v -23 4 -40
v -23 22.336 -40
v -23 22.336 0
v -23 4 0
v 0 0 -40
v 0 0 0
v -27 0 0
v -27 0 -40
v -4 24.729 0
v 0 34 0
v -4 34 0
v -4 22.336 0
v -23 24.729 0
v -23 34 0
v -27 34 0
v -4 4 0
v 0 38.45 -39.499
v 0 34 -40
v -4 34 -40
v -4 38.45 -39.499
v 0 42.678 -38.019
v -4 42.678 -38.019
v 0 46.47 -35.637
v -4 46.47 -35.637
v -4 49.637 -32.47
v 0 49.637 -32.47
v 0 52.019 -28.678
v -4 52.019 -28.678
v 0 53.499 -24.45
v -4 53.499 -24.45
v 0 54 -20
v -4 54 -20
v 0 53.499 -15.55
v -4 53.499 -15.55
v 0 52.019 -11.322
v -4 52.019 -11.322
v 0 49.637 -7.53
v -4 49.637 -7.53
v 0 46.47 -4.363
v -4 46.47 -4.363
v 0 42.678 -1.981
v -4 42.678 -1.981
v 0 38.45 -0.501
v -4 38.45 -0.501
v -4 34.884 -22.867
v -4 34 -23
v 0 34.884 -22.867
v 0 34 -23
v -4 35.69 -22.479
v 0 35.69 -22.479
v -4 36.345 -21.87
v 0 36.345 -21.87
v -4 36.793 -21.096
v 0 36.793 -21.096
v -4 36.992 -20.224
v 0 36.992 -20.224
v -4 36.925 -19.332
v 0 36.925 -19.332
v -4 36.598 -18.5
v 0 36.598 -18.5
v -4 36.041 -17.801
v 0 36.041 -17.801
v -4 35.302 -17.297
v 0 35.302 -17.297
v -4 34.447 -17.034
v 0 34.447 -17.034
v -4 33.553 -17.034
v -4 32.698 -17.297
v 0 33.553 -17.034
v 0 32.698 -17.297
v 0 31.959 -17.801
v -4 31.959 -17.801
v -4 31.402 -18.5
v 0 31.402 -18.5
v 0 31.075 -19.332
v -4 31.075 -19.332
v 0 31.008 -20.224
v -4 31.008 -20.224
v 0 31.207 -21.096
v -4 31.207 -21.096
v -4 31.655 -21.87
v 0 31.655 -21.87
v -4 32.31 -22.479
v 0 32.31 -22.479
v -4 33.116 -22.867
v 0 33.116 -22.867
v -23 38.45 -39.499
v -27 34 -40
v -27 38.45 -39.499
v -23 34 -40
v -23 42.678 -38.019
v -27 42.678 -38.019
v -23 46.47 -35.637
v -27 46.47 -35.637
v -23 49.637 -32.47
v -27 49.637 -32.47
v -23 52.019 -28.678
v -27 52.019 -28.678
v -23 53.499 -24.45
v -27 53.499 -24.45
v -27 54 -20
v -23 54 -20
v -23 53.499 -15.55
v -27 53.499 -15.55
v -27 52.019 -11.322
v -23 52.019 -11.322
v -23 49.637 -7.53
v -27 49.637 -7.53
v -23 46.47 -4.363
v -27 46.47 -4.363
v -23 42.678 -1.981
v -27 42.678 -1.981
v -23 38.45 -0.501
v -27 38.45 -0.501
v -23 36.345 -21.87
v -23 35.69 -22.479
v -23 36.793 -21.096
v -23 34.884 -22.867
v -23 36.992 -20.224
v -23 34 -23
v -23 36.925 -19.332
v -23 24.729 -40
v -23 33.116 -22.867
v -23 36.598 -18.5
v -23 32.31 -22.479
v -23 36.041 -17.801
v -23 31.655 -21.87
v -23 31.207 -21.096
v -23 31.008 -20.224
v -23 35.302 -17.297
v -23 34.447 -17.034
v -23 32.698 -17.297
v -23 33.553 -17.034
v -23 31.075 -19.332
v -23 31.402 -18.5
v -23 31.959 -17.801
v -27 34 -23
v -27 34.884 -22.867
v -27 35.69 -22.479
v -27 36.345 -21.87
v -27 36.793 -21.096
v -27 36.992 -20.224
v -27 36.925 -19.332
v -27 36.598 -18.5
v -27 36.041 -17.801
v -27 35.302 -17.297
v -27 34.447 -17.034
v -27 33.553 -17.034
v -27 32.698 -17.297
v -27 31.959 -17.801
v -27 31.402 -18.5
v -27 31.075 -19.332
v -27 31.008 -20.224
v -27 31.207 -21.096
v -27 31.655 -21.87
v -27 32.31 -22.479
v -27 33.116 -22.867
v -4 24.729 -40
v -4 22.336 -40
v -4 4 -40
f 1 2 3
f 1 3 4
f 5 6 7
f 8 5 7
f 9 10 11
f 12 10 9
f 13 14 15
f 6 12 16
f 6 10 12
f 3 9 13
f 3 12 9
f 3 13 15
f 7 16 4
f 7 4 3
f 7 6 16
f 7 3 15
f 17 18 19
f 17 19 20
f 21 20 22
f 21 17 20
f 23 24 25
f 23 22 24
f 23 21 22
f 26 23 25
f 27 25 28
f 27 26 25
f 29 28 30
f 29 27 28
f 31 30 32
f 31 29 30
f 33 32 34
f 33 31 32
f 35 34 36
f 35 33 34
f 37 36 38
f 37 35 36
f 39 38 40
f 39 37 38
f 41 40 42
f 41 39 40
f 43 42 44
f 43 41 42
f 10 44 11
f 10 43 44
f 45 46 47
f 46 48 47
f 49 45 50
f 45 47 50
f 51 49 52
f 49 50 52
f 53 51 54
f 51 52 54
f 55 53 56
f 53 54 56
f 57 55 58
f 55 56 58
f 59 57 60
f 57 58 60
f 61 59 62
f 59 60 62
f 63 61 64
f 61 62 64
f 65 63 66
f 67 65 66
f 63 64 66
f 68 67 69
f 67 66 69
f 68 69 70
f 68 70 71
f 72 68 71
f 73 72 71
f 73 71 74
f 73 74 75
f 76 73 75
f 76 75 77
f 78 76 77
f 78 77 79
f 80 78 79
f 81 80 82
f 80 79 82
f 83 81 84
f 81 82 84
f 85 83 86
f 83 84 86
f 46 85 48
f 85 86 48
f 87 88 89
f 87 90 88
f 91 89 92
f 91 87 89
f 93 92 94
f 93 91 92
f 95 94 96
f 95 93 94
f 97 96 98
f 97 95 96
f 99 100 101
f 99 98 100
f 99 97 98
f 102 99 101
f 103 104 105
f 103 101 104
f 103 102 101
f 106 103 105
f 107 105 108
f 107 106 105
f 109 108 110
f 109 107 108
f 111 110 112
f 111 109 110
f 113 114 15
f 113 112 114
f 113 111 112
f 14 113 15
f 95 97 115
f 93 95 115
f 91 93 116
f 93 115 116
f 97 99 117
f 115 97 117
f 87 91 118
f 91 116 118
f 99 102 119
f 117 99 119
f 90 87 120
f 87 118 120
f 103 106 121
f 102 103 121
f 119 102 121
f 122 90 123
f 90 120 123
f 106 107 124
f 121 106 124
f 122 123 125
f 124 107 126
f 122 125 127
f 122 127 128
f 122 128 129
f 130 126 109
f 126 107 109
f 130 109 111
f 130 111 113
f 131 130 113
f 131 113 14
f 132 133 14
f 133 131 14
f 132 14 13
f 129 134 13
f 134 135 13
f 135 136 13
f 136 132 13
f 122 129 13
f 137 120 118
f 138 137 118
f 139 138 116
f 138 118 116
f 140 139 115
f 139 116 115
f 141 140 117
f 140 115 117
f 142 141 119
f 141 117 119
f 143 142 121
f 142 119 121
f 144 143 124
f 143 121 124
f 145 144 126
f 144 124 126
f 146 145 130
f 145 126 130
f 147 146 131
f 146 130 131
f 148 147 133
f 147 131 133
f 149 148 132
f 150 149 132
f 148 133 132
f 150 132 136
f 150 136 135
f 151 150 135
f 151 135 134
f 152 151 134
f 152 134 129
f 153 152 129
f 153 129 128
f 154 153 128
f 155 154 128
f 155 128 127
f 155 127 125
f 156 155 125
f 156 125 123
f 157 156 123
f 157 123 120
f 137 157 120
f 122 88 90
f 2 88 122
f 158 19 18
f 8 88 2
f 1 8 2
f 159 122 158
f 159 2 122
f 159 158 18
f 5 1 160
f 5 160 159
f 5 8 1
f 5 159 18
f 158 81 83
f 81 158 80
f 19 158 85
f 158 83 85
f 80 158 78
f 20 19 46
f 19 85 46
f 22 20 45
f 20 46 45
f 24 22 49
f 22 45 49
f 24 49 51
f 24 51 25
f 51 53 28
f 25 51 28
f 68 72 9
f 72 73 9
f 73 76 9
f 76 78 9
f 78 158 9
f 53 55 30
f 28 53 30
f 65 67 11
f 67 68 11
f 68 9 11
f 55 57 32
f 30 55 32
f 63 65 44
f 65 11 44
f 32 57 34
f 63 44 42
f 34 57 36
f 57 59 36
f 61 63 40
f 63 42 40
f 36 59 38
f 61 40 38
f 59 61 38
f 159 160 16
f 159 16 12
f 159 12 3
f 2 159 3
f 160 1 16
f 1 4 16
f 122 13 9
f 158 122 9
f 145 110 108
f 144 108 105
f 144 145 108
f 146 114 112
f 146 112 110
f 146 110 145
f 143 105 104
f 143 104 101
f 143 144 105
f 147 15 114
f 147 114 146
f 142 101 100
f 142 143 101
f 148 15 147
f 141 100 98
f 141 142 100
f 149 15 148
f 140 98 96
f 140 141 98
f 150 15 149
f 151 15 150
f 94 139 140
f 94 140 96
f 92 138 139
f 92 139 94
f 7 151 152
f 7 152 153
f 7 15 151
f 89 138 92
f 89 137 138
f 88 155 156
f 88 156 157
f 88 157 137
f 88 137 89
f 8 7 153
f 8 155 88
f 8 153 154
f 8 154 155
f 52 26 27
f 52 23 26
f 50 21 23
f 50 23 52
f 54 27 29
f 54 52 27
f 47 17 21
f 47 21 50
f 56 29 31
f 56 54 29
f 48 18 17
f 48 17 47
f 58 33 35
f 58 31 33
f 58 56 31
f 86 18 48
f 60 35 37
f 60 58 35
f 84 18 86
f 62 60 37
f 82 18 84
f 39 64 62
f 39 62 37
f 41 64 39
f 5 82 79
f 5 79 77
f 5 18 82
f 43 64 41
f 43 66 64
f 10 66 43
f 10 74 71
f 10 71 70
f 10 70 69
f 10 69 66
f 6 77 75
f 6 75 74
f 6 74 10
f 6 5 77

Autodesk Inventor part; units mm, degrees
ref_plane "YZ Plane" through (0, 0, 0) normal (1, 0, 0) x (0, 1, 0)
ref_plane "XZ Plane" through (0, 0, 0) normal (0, 1, 0) x (-1, 0, 0)
ref_plane "XY Plane" through (0, 0, 0) normal (0, 0, 1) x (1, 0, 0)
sketch "Boceto1" plane through (0, 0, 0) normal (0, 1, 0) x (-1, 0, 0)
  line L0 (0, 0) -> (27, 0)
  line L1 (27, 0) -> (27, -40)
  line L2 (27, -40) -> (0, -40)
  line L3 (0, -40) -> (0, 0)
  dimension "d0" = 27
  dimension "d1" = 40
extrude "Extrusión1" add sketch "Boceto1" along normal blind 54
sketch "Boceto2" plane through (-27, 0, 0) normal (0, 0, 1) x (1, 0, 0)
  line L0 (4, 4) -> (23, 4)
  line L1 (23, 4) -> (23, 22.3365)
  line L2 (23, 22.3365) -> (4, 22.3365)
  line L3 (4, 22.3365) -> (4, 4)
  line L4 (0, 0) -> (27, 0) projected
  line L5 (27, 0) -> (27, 54) projected
  line L6 (0, 54) -> (27, 54) projected
  line L7 (0, 0) -> (0, 54) projected
  line L8 (27, 54) -> (0, 54) projected
  line L9 (4, 24.7292) -> (23, 24.7292)
  line L10 (23, 24.7292) -> (23, 54)
  line L11 (23, 54) -> (4, 54)
  line L12 (4, 54) -> (4, 24.7292)
  point P0 (4, 54)
  dimension "d4" = 4
  dimension "d5" = 4
  dimension "d6" = 4
extrude "Extrusión2" cut sketch "Boceto2" against normal blind 54 contours L3 L2 L1 L0 | L6 L10 L9 L12
sketch "Boceto3" plane through (0, 0, 0) normal (1, 0, 0) x (0, 0, -1)
  line L0 (0, 0) -> (40, 0) projected
  line L1 (40, 0) -> (40, 54) projected
  line L2 (0, 54) -> (40, 54) projected
  line L3 (0, 0) -> (0, 54) projected
  line L4 (0, 54) -> (40, 54) projected
  line L5 (20, 54) -> (20, 34)
  circle A0 centre (20, 34) radius 3
  dimension "d9" = 20
  dimension "d10" = 6
extrude "Extrusión3" cut sketch "Boceto3" against normal blind 54 contours A0
sketch "Boceto4" plane through (0, 0, 0) normal (1, 0, 0) x (0, 0, -1)
  circle A0 centre (20, 34) radius 3 projected
  line L0 (0, 0) -> (40, 0) projected
  line L1 (40, 0) -> (40, 54) projected
  line L2 (0, 54) -> (40, 54) projected
  line L3 (0, 0) -> (0, 54) projected
  line L4 (40, 54) -> (0, 54) projected
  circle A1 centre (20, 34) radius 3 projected
  circle A2 centre (20, 34) radius 20
  point P0 (0, 34)
  point P1 (20, 54)
  point P2 (40, 34)
extrude "Extrusión4" cut sketch "Boceto4" against normal blind 54 contours L3 L2 A2 | A2 L2 L1
properties part number "REDONDA"
